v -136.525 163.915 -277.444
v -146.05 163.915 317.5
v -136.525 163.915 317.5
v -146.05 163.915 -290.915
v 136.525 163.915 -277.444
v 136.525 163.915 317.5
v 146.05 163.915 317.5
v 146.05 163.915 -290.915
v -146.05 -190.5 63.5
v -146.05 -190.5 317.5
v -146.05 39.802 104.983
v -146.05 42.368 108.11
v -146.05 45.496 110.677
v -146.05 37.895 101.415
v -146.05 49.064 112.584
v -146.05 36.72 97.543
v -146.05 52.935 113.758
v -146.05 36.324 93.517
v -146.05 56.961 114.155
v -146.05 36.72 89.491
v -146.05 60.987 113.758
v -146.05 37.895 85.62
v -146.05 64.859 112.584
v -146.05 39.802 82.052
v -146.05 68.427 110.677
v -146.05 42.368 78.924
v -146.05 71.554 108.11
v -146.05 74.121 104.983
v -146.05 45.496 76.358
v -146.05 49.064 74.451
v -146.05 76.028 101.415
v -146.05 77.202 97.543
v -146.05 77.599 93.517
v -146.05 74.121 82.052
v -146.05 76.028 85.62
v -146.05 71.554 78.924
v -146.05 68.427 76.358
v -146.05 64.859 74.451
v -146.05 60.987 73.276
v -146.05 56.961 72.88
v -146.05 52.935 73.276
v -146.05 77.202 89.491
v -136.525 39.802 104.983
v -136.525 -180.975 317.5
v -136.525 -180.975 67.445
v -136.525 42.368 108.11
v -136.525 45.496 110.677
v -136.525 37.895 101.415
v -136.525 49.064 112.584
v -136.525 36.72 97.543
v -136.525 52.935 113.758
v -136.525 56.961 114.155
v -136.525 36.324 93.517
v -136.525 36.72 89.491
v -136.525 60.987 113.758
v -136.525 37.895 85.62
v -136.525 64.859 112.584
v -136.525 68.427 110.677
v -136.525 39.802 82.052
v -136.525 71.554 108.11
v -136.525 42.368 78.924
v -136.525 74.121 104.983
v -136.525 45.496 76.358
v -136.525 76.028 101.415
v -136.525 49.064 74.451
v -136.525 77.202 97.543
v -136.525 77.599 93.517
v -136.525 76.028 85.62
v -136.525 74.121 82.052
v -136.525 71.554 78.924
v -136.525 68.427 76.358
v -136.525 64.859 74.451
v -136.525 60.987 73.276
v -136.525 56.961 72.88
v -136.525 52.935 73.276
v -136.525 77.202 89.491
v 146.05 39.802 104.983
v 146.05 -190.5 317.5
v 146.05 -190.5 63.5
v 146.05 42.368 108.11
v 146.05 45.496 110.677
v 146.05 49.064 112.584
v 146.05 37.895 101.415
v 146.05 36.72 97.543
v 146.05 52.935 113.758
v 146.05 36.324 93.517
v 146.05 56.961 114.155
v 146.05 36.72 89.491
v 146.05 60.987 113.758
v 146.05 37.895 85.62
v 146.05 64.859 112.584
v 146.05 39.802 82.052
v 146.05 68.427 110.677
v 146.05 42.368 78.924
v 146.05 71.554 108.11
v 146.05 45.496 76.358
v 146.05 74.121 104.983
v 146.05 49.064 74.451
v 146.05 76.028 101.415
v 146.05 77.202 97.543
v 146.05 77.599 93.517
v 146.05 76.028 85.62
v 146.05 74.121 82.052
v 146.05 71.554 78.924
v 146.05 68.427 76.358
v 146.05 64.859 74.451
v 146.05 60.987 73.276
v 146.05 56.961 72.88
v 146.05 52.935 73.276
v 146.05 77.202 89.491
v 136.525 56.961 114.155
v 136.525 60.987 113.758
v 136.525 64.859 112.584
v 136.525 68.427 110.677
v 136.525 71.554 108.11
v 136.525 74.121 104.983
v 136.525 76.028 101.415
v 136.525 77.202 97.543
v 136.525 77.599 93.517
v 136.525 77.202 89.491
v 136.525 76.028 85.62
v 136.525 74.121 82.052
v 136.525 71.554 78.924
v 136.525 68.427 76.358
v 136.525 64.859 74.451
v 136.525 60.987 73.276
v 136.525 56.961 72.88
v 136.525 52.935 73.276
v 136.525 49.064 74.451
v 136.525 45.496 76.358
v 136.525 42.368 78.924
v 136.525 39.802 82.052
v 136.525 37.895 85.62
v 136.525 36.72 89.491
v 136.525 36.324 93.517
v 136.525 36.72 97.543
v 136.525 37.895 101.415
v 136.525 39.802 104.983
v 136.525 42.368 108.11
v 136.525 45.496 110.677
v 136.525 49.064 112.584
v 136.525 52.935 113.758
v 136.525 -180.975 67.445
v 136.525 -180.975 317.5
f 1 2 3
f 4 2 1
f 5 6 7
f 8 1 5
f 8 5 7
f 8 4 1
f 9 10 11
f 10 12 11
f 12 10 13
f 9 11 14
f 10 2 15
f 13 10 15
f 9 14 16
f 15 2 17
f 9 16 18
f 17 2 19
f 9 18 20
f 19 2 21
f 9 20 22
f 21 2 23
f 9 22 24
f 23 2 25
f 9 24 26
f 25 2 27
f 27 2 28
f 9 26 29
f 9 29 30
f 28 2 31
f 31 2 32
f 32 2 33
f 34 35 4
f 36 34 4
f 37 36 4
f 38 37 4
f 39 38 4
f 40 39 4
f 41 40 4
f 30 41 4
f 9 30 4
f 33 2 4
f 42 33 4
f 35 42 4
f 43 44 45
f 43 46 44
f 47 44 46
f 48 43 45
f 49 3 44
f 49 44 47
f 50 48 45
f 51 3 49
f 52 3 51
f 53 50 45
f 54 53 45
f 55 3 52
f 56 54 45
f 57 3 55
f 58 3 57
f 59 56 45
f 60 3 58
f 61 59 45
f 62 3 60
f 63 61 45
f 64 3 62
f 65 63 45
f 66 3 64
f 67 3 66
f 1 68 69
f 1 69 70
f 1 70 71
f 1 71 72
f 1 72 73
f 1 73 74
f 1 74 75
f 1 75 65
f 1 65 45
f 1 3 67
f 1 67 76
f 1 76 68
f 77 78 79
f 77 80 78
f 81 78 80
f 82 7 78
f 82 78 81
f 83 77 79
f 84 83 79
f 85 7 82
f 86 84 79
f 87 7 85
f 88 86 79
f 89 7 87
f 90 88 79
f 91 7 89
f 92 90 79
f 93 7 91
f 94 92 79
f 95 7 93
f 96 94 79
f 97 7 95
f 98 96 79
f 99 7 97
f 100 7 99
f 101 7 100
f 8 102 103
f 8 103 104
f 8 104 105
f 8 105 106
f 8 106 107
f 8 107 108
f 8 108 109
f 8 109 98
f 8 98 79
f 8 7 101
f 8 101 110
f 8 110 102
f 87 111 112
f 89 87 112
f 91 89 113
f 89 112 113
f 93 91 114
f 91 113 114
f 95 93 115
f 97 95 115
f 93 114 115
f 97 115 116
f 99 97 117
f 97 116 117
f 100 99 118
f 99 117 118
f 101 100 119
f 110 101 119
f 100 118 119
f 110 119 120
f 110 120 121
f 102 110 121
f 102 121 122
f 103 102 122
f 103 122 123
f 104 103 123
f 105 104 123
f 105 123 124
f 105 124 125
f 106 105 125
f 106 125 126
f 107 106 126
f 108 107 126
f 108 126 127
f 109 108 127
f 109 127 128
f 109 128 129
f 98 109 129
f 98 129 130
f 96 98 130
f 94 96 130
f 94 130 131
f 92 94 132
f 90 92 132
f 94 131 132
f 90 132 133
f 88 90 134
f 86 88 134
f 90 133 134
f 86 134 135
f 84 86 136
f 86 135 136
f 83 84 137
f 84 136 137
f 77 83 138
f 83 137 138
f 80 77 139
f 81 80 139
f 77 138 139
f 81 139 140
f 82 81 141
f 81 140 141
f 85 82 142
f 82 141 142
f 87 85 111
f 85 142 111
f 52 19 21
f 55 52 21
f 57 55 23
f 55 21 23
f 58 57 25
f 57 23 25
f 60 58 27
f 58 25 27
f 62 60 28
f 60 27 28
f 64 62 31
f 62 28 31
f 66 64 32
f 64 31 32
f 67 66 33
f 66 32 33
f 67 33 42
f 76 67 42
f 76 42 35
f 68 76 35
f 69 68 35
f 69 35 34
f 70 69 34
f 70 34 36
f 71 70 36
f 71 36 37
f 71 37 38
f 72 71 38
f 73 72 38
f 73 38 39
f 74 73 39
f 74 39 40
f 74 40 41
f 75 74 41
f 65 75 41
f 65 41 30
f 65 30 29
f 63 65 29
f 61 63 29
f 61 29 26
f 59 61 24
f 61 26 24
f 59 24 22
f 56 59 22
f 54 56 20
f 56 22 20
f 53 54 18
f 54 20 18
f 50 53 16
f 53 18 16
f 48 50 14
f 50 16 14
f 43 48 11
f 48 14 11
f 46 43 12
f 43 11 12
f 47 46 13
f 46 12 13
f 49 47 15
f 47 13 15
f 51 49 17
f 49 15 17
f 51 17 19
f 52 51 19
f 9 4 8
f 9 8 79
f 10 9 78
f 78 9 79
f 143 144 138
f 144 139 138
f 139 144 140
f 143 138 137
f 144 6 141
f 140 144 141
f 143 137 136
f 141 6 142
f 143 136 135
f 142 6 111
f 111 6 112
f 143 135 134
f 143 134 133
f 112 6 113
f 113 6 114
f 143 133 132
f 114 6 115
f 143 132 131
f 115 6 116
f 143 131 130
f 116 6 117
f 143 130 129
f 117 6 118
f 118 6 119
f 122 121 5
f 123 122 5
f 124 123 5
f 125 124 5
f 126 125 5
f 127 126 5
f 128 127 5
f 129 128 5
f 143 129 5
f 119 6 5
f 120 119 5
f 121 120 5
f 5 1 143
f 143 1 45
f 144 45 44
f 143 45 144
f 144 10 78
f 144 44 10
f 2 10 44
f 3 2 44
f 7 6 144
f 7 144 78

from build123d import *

# Parameters (mm, degrees)
SKETCH2_W           = 292.1
SKETCH2_H           = 635
BOSS_EXTRUDE1_DEPTH = 190.5
CUT_EXTRUDE2_DEPTH  = 381
SHELL1_T            = -9.525
SKETCH5_W           = 292.1
SKETCH5_H           = 635
CUT_EXTRUDE3_DEPTH  = 24.892
SKETCH6_R           = 20.6375
CUT_EXTRUDE4_DEPTH  = 514.096
SKETCH10_W          = 292.1
SKETCH10_H          = 610.108
CUT_EXTRUDE7_DEPTH  = 1.693333333


with BuildPart() as part:
    # Sketch2 → Boss-Extrude1 (new body, symmetric)
    with BuildSketch(Plane(origin=(0, 0, 0), x_dir=(1, 0, 0), z_dir=(0, 1, 0))):
        Rectangle(SKETCH2_W, SKETCH2_H)
    extrude(amount=BOSS_EXTRUDE1_DEPTH, both=True)

    # Sketch4 → Cut-Extrude2 (cut)
    with BuildSketch(Plane.ZY.offset(146.05)):
        Polygon((-317.5, 190.5), (63.5, -190.5), (-317.5, -190.5), align=None)
    extrude(amount=-CUT_EXTRUDE2_DEPTH, mode=Mode.SUBTRACT)

    # Shell1
    shell1_openings = [part.faces().sort_by_distance(p)[0] for p in [
        (0, 0, 317.5),
    ]]
    offset(amount=SHELL1_T, openings=shell1_openings, kind=Kind.INTERSECTION)

    # Sketch5 → Cut-Extrude3 (cut)
    with BuildSketch(Plane(origin=(0, 190.5, 0), x_dir=(1, 0, 0), z_dir=(0, 1, 0))):
        Rectangle(SKETCH5_W, SKETCH5_H)
    extrude(amount=-CUT_EXTRUDE3_DEPTH, mode=Mode.SUBTRACT)

    # Sketch6 → Cut-Extrude4 (cut)
    with BuildSketch(Plane.ZY.offset(146.05)):
        with Locations((93.517292524, 56.961208915)):
            Circle(SKETCH6_R)
    extrude(amount=-CUT_EXTRUDE4_DEPTH, mode=Mode.SUBTRACT)

    # Sketch10 → Cut-Extrude7 (cut)
    with BuildSketch(Plane(origin=(0, 165.608, 0), x_dir=(1, 0, 0), z_dir=(0, 1, 0))):
        with Locations((0, -12.446)):
            Rectangle(SKETCH10_W, SKETCH10_H)
    extrude(amount=-CUT_EXTRUDE7_DEPTH, mode=Mode.SUBTRACT)


solid = part.part
